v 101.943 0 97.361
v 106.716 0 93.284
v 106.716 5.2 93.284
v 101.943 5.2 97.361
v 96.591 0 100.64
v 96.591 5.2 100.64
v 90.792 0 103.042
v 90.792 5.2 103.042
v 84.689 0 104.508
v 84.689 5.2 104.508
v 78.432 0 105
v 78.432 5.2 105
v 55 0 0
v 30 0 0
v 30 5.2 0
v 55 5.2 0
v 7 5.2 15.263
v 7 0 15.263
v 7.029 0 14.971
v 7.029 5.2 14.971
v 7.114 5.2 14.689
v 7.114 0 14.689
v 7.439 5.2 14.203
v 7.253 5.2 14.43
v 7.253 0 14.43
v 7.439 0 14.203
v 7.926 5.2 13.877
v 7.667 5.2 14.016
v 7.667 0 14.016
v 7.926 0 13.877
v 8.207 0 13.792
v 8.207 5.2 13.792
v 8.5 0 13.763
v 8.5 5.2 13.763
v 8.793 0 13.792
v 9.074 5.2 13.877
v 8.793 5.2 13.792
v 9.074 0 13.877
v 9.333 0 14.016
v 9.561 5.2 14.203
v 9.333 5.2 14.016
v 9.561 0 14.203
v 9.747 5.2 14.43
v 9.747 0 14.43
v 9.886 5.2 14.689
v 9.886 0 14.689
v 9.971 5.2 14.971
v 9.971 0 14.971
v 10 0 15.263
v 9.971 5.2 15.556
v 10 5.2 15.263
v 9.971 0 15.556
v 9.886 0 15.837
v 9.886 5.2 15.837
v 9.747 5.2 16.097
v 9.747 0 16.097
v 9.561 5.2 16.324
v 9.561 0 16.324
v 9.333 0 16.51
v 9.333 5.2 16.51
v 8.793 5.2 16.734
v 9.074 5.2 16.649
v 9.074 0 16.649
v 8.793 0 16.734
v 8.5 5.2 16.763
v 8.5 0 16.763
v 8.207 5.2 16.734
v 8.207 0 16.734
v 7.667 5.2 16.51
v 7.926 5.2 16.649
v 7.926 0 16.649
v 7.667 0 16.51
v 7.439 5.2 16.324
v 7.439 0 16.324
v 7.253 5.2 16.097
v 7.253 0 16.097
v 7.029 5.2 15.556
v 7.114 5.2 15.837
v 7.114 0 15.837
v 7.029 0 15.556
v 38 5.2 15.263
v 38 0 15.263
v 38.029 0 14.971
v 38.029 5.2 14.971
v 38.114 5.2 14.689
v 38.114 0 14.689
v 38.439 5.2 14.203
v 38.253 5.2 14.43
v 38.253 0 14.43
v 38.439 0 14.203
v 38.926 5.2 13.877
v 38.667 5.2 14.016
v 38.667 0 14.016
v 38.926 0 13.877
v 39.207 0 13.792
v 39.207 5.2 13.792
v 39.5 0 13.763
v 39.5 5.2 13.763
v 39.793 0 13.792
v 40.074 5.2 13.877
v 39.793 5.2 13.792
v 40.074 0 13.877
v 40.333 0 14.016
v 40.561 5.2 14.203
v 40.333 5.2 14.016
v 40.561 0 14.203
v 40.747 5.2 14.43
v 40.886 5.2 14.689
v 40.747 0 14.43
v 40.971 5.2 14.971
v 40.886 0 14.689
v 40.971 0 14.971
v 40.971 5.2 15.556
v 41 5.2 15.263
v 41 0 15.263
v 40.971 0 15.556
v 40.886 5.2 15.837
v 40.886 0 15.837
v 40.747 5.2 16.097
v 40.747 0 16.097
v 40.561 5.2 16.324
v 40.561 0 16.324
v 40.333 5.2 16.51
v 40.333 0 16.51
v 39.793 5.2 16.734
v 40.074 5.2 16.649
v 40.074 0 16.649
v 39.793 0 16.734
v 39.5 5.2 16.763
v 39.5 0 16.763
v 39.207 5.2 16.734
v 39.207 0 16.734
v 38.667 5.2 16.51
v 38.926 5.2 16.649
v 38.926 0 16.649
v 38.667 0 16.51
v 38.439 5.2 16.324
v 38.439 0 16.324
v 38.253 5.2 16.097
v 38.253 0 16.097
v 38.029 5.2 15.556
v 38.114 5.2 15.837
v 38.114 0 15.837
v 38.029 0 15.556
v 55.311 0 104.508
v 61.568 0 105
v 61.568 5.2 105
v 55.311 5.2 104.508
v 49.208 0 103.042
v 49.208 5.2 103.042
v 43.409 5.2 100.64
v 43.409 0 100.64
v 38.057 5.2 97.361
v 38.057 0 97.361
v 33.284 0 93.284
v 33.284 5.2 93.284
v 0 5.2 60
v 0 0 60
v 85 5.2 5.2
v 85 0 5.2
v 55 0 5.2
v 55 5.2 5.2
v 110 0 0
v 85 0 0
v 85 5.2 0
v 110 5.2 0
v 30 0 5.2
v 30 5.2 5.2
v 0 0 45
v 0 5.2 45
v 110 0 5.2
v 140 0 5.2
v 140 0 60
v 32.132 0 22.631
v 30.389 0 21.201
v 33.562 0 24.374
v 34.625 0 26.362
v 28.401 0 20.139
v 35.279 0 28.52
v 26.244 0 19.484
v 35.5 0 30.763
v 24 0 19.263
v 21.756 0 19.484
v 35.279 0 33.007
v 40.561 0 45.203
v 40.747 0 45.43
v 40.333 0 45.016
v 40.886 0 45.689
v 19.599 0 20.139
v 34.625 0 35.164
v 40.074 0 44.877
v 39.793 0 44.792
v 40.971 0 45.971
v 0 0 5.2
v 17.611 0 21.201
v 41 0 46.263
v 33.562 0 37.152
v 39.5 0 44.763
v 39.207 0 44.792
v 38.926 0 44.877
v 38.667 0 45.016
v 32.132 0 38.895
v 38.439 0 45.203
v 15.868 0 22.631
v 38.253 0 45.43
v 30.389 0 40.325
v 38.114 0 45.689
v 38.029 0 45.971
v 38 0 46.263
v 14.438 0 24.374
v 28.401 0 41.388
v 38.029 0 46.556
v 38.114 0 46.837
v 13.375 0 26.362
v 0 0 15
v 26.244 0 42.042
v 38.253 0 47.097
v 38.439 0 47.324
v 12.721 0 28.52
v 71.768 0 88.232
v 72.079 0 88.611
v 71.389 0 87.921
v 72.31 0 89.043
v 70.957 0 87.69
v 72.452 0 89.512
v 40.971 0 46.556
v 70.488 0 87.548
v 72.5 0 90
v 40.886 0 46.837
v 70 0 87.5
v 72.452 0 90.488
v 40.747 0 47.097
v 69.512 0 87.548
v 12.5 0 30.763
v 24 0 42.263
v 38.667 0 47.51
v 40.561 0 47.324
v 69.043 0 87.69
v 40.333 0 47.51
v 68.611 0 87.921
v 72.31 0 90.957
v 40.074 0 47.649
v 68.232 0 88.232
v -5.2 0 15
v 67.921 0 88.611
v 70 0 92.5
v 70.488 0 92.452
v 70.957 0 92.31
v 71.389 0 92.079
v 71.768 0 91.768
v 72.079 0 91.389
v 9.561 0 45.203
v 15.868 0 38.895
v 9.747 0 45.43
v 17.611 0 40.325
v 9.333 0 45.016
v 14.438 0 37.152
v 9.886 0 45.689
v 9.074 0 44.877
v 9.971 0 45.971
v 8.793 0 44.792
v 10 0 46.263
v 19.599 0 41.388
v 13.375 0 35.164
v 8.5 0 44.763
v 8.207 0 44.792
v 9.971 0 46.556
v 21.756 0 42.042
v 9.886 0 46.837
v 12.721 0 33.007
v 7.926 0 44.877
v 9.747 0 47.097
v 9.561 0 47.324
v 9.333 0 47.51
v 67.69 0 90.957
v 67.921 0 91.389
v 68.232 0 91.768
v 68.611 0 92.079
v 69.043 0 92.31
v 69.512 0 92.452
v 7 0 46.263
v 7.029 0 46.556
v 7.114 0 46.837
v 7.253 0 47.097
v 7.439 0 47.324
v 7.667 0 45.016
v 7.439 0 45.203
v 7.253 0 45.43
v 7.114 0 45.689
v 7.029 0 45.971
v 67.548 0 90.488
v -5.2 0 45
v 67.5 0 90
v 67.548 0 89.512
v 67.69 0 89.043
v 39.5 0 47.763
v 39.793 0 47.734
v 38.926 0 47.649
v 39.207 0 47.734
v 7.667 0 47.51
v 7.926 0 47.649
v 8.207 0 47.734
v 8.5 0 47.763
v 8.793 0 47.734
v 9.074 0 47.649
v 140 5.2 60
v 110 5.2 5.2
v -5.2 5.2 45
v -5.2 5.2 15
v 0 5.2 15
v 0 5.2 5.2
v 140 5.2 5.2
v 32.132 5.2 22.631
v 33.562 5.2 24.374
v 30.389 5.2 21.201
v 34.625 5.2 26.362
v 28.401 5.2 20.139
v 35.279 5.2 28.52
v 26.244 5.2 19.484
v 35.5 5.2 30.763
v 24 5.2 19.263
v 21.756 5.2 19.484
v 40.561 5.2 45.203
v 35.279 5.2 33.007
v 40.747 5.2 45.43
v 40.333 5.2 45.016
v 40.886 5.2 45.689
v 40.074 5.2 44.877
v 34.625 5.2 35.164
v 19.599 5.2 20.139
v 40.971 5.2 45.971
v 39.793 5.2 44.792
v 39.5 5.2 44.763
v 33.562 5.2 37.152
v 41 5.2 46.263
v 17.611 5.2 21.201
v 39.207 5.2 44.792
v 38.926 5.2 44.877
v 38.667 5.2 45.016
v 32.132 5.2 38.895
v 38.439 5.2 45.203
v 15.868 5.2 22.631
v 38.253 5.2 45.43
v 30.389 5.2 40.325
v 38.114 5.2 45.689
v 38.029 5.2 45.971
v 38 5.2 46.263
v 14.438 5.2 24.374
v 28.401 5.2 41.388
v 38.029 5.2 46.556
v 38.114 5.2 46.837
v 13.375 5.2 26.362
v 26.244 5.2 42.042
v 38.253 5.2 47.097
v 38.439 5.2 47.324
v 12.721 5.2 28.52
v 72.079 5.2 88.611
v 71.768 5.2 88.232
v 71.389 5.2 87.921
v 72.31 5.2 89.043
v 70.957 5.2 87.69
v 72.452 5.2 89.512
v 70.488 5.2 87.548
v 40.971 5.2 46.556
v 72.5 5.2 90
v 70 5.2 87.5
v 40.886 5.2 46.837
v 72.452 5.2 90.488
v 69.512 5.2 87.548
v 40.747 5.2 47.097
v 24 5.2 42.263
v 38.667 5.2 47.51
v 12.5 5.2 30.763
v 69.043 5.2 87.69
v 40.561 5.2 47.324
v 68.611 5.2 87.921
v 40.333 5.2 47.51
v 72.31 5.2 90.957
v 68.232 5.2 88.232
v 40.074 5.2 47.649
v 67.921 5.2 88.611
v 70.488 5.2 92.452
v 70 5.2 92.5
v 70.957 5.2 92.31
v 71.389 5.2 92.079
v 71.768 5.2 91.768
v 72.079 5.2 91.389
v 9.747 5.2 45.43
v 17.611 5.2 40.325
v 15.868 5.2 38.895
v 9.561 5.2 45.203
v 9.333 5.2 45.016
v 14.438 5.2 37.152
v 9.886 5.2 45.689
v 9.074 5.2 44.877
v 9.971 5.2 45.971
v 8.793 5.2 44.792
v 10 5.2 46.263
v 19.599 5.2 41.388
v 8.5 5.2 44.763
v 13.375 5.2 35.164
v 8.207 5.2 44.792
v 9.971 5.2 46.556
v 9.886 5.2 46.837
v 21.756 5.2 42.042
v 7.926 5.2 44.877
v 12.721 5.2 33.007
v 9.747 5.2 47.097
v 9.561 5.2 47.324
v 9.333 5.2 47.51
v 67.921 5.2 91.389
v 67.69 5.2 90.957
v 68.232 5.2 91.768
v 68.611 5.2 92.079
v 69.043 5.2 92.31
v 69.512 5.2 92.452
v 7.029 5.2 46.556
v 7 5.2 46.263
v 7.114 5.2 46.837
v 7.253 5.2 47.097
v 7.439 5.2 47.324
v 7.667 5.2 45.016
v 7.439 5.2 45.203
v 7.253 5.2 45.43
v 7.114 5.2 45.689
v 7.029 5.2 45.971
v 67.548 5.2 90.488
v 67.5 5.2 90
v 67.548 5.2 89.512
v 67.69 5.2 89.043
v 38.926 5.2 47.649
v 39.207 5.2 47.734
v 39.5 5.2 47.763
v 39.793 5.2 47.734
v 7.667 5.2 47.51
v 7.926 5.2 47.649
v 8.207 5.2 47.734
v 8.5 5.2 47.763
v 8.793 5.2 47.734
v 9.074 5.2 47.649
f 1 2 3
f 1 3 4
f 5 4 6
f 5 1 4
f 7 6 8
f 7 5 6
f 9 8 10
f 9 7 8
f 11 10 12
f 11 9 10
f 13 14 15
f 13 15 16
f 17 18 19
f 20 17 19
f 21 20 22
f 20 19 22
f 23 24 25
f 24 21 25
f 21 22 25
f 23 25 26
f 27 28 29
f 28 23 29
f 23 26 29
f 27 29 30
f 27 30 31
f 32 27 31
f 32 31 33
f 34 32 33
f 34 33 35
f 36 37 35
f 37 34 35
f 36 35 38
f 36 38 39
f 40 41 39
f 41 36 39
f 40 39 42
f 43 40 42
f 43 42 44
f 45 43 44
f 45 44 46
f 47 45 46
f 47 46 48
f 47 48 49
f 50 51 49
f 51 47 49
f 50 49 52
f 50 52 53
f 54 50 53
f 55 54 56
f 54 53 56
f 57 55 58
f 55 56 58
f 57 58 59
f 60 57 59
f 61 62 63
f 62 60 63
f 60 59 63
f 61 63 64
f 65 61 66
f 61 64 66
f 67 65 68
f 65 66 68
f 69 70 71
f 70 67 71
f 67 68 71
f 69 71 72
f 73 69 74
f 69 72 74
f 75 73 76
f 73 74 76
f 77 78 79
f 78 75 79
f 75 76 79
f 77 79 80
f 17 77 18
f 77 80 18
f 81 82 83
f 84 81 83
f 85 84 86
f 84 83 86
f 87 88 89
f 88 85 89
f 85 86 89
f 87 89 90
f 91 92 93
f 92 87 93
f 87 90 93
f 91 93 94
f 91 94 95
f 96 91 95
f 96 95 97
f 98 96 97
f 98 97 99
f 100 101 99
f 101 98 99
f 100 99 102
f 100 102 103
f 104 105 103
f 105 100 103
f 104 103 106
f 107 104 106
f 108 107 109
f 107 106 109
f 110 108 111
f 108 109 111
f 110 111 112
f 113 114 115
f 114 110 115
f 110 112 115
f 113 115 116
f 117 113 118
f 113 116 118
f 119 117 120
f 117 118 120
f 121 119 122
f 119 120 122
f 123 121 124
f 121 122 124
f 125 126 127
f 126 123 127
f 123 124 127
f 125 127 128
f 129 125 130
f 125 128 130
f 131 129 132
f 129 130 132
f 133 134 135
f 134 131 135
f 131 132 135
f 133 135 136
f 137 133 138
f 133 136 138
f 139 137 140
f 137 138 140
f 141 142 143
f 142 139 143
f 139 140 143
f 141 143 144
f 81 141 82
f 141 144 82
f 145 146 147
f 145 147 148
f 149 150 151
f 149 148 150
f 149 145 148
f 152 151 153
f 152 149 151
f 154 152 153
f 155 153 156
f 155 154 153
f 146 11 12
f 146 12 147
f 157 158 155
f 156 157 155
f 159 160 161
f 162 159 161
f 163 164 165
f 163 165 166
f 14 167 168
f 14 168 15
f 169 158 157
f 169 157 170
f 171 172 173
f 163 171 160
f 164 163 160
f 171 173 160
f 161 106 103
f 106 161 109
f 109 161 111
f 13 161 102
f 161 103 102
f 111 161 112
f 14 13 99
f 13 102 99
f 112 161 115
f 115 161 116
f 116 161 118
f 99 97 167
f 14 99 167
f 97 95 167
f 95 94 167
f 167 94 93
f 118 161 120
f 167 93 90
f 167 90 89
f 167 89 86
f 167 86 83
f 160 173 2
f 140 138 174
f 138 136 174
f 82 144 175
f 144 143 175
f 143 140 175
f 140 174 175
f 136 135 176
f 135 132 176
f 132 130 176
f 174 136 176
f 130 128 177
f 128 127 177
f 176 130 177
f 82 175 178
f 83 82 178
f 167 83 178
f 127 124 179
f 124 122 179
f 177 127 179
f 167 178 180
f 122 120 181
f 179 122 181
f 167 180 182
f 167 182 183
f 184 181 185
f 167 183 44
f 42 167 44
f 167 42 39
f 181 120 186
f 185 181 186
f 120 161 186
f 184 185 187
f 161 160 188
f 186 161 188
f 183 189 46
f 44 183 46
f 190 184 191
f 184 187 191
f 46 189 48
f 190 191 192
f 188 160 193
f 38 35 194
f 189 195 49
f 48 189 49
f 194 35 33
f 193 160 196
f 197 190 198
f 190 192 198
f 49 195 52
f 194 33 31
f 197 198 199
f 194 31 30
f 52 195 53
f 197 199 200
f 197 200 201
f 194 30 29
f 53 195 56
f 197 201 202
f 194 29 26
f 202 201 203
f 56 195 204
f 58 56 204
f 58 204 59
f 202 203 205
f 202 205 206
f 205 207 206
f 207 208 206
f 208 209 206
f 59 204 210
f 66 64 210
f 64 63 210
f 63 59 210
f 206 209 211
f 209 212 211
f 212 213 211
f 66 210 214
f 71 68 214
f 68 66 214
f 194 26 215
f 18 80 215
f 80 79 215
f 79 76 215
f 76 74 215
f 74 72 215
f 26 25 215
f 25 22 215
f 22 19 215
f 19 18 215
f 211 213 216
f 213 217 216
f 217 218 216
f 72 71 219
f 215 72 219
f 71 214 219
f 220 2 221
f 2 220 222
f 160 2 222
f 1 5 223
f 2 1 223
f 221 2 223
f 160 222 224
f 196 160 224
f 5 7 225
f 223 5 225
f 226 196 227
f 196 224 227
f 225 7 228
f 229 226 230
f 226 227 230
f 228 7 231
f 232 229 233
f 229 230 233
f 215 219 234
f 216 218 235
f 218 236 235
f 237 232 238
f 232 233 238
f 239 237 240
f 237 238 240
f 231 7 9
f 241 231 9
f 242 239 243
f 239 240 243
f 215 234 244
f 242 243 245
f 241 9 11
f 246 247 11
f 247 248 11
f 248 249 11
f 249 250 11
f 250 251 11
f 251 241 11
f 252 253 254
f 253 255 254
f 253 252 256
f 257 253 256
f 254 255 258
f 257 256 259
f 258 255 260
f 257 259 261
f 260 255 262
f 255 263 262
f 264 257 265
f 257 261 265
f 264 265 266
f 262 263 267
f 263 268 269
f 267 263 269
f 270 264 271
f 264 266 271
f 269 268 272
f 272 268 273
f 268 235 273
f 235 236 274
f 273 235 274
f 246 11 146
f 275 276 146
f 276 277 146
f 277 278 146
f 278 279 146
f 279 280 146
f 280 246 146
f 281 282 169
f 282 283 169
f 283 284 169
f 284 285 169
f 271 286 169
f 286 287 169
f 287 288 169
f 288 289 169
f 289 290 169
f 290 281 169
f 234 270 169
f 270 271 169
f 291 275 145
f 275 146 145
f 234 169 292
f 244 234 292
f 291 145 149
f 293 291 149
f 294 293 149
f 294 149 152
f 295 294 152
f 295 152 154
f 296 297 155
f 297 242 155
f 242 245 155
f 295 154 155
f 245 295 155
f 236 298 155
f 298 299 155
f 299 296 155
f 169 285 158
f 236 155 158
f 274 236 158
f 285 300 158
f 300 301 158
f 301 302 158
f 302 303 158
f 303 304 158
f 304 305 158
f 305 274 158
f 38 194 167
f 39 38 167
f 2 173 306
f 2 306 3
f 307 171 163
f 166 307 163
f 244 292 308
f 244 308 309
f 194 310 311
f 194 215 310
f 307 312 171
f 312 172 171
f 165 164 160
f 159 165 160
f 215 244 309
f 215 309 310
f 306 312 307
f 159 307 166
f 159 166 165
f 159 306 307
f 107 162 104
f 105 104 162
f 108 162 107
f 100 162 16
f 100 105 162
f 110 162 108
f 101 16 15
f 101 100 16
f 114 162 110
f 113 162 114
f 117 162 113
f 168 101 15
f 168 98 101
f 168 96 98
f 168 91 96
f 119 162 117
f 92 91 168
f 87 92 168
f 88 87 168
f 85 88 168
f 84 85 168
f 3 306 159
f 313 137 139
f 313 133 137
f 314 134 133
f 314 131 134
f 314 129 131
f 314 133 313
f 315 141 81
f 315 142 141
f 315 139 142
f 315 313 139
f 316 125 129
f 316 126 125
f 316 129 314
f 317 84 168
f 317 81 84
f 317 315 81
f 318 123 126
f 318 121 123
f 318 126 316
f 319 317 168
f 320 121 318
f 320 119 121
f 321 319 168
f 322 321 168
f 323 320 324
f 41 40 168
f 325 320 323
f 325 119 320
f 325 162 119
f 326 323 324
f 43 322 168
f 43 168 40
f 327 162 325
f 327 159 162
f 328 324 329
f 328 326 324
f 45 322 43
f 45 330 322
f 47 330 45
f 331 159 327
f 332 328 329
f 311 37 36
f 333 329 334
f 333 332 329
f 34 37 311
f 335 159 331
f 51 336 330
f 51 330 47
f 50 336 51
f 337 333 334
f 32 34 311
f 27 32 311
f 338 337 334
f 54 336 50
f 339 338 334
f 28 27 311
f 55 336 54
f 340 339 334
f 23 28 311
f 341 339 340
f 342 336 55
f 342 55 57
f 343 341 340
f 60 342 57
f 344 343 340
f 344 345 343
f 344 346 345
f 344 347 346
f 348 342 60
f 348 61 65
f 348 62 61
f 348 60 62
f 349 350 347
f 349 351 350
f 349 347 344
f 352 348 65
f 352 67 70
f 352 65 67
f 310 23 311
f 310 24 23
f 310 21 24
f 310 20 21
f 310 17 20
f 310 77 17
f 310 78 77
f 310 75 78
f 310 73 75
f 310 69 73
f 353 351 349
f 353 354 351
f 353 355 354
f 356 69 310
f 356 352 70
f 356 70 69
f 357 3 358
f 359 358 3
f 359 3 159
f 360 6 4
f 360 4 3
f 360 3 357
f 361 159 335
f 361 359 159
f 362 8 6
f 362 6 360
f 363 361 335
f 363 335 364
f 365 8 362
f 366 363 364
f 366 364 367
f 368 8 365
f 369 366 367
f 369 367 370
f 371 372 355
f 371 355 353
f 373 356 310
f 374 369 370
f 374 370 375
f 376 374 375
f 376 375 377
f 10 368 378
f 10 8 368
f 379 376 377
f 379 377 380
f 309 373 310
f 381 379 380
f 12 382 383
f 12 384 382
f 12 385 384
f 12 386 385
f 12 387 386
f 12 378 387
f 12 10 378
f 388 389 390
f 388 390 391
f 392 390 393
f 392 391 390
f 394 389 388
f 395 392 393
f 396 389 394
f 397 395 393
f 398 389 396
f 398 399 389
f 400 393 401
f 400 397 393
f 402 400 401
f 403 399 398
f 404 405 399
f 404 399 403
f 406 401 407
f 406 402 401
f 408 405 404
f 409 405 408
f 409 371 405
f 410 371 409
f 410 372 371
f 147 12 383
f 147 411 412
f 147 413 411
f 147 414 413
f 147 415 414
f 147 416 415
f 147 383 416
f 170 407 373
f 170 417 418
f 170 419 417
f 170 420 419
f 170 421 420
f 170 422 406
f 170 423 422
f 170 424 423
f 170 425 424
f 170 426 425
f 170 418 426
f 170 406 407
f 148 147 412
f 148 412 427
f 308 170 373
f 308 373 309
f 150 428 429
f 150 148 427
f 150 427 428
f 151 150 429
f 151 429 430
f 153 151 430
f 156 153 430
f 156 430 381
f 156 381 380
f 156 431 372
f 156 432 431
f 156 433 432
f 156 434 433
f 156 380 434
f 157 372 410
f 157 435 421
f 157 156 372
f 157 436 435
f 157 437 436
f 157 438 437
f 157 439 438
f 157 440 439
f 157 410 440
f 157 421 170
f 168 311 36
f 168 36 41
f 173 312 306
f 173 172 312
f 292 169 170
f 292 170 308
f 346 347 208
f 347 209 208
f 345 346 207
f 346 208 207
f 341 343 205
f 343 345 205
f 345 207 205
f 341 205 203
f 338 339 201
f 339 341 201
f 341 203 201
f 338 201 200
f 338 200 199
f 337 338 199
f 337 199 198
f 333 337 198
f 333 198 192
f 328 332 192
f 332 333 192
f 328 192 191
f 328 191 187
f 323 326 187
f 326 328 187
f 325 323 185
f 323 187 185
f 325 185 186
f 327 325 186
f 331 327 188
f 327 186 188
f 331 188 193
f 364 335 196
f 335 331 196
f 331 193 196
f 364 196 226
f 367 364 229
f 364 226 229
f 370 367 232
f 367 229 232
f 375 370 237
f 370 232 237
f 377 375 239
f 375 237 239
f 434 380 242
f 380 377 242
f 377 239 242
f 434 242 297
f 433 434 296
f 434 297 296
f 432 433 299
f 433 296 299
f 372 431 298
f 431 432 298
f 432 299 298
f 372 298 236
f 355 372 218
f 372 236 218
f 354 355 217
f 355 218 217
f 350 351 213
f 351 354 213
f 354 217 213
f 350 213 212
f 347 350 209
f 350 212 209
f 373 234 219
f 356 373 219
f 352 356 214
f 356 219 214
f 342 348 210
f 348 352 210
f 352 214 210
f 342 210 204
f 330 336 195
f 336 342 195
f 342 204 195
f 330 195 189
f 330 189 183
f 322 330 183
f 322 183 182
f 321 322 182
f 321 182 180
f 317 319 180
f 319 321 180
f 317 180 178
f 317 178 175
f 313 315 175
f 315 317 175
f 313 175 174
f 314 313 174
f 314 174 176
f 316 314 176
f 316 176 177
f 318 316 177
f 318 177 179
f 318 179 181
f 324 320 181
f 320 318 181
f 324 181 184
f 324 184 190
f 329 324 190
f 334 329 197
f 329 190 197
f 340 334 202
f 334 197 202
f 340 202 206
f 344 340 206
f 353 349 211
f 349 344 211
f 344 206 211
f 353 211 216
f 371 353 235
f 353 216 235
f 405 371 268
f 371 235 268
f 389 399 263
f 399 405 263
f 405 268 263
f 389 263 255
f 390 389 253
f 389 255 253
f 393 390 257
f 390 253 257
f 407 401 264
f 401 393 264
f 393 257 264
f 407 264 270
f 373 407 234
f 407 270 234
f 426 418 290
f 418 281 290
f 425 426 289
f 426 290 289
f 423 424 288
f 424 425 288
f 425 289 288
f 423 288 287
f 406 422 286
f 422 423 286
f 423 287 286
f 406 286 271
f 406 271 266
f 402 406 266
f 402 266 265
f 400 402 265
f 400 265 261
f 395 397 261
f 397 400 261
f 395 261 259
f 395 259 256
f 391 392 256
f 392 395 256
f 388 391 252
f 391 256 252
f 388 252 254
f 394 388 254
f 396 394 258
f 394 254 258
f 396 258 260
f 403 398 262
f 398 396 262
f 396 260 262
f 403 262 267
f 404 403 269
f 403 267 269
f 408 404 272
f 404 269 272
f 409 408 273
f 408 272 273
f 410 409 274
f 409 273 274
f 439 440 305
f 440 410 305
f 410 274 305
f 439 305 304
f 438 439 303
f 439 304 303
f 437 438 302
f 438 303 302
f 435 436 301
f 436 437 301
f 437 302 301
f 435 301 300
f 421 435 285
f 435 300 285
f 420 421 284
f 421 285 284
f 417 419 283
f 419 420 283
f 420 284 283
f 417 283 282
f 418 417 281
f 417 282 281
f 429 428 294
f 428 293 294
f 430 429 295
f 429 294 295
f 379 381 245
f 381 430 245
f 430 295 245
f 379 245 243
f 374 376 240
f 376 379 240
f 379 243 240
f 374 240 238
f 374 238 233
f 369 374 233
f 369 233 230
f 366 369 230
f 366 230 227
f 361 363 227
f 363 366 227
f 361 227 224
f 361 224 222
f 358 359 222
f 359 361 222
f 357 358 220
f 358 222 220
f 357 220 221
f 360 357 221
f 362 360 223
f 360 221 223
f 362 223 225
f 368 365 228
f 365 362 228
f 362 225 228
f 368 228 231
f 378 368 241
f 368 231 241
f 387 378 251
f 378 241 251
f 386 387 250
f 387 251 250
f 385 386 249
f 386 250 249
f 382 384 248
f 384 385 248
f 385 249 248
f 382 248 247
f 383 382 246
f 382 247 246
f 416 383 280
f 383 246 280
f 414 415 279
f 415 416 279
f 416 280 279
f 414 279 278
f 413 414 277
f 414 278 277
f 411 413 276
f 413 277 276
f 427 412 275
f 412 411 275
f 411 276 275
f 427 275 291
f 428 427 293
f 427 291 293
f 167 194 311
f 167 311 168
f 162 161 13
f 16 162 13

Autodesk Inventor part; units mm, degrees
ref_plane "YZ Plane" through (0, 0, 0) normal (1, 0, 0) x (0, 1, 0)
ref_plane "XZ Plane" through (0, 0, 0) normal (0, 1, 0) x (-1, 0, 0)
ref_plane "XY Plane" through (0, 0, 0) normal (0, 0, 1) x (1, 0, 0)
sketch "Sketch1" plane through (0, 0, 0) normal (0, 1, 0) x (-1, 0, 0)
  line L0 (0, 0) -> (-140, 0)
  line L1 (-140, 0) -> (-140, 60)
  line L2 (-78.4315, 105) -> (-61.5685, 105)
  line L3 (0, 60) -> (-33.2843, 93.2843)
  line L4 (-140, 60) -> (-106.7157, 93.2843)
  arc A0 (-33.2843, 93.2843) -> (-61.5685, 105) centre (-61.5685, 65) ccw
  arc A1 (-78.4315, 105) -> (-106.7157, 93.2843) centre (-78.4315, 65) ccw
  circle A2 centre (-70, 90) radius 2.5
  line L5 (-85, 0) -> (-85, 5.2)
  line L6 (-85, 5.2) -> (-55, 5.2)
  line L7 (-55, 5.2) -> (-55, 0)
  circle A3 centre (-24, 30.7632) radius 11.5
  circle A4 centre (-39.5, 46.2632) radius 1.5
  circle A5 centre (-39.5, 15.2632) radius 1.5
  circle A6 centre (-8.5, 15.2632) radius 1.5
  circle A7 centre (-8.5, 46.2632) radius 1.5
  line L8 (-30, 0) -> (0, 0)
  line L9 (0, 0) -> (0, 5.2)
  line L10 (0, 5.2) -> (-30, 5.2)
  line L11 (-30, 5.2) -> (-30, 0)
  line L12 (-110, 0) -> (-140, 0)
  line L13 (-140, 0) -> (-140, 5.2)
  line L14 (-140, 5.2) -> (-110, 5.2)
  line L15 (-110, 5.2) -> (-110, 0)
  line L16 (0, 45) -> (5.2, 45)
  line L17 (5.2, 45) -> (5.2, 15)
  line L18 (5.2, 15) -> (0, 15)
  line L19 (0, 60) -> (0, 45)
  line L20 (0, 15) -> (0, 0)
  point P0 (-45, 105)
  point P1 (-95, 105)
  point P2 (-70, 105)
  dimension "d0" = 140
  dimension "d1" = 60
  dimension "d3" = 135
  dimension "d4" = 50
  dimension "d5" = 40
  dimension "d8" = 5
  dimension "d12" = 90
  dimension "d13" = 30
  dimension "d14" = 15
  dimension "d15" = 5.2
  dimension "d16" = 23
  dimension "d17" = 75
  dimension "d18" = 3
  dimension "d19" = 15.5
  dimension "d20" = 15.5
  dimension "d23" = 360
  dimension "d25" = 30
  dimension "d26" = 5.2
  dimension "d28" = 30
  dimension "d29" = 5.2
  dimension "d35" = 30
  dimension "d36" = 15
  dimension "d37" = 24
  dimension "d38" = 15
  dimension "d39" = 5.2
  dimension "d40" = 5.2
  dimension "d41" = 70
extrude "Extrusion3" add sketch "Sketch1" along normal blind 5.2 contours L0 L7 L6 L5 L15 L14 L1 L4 A1 L2 A0 L3 L19 L16 L17 L18 L20 L10 L11
properties part number "side Plate"
